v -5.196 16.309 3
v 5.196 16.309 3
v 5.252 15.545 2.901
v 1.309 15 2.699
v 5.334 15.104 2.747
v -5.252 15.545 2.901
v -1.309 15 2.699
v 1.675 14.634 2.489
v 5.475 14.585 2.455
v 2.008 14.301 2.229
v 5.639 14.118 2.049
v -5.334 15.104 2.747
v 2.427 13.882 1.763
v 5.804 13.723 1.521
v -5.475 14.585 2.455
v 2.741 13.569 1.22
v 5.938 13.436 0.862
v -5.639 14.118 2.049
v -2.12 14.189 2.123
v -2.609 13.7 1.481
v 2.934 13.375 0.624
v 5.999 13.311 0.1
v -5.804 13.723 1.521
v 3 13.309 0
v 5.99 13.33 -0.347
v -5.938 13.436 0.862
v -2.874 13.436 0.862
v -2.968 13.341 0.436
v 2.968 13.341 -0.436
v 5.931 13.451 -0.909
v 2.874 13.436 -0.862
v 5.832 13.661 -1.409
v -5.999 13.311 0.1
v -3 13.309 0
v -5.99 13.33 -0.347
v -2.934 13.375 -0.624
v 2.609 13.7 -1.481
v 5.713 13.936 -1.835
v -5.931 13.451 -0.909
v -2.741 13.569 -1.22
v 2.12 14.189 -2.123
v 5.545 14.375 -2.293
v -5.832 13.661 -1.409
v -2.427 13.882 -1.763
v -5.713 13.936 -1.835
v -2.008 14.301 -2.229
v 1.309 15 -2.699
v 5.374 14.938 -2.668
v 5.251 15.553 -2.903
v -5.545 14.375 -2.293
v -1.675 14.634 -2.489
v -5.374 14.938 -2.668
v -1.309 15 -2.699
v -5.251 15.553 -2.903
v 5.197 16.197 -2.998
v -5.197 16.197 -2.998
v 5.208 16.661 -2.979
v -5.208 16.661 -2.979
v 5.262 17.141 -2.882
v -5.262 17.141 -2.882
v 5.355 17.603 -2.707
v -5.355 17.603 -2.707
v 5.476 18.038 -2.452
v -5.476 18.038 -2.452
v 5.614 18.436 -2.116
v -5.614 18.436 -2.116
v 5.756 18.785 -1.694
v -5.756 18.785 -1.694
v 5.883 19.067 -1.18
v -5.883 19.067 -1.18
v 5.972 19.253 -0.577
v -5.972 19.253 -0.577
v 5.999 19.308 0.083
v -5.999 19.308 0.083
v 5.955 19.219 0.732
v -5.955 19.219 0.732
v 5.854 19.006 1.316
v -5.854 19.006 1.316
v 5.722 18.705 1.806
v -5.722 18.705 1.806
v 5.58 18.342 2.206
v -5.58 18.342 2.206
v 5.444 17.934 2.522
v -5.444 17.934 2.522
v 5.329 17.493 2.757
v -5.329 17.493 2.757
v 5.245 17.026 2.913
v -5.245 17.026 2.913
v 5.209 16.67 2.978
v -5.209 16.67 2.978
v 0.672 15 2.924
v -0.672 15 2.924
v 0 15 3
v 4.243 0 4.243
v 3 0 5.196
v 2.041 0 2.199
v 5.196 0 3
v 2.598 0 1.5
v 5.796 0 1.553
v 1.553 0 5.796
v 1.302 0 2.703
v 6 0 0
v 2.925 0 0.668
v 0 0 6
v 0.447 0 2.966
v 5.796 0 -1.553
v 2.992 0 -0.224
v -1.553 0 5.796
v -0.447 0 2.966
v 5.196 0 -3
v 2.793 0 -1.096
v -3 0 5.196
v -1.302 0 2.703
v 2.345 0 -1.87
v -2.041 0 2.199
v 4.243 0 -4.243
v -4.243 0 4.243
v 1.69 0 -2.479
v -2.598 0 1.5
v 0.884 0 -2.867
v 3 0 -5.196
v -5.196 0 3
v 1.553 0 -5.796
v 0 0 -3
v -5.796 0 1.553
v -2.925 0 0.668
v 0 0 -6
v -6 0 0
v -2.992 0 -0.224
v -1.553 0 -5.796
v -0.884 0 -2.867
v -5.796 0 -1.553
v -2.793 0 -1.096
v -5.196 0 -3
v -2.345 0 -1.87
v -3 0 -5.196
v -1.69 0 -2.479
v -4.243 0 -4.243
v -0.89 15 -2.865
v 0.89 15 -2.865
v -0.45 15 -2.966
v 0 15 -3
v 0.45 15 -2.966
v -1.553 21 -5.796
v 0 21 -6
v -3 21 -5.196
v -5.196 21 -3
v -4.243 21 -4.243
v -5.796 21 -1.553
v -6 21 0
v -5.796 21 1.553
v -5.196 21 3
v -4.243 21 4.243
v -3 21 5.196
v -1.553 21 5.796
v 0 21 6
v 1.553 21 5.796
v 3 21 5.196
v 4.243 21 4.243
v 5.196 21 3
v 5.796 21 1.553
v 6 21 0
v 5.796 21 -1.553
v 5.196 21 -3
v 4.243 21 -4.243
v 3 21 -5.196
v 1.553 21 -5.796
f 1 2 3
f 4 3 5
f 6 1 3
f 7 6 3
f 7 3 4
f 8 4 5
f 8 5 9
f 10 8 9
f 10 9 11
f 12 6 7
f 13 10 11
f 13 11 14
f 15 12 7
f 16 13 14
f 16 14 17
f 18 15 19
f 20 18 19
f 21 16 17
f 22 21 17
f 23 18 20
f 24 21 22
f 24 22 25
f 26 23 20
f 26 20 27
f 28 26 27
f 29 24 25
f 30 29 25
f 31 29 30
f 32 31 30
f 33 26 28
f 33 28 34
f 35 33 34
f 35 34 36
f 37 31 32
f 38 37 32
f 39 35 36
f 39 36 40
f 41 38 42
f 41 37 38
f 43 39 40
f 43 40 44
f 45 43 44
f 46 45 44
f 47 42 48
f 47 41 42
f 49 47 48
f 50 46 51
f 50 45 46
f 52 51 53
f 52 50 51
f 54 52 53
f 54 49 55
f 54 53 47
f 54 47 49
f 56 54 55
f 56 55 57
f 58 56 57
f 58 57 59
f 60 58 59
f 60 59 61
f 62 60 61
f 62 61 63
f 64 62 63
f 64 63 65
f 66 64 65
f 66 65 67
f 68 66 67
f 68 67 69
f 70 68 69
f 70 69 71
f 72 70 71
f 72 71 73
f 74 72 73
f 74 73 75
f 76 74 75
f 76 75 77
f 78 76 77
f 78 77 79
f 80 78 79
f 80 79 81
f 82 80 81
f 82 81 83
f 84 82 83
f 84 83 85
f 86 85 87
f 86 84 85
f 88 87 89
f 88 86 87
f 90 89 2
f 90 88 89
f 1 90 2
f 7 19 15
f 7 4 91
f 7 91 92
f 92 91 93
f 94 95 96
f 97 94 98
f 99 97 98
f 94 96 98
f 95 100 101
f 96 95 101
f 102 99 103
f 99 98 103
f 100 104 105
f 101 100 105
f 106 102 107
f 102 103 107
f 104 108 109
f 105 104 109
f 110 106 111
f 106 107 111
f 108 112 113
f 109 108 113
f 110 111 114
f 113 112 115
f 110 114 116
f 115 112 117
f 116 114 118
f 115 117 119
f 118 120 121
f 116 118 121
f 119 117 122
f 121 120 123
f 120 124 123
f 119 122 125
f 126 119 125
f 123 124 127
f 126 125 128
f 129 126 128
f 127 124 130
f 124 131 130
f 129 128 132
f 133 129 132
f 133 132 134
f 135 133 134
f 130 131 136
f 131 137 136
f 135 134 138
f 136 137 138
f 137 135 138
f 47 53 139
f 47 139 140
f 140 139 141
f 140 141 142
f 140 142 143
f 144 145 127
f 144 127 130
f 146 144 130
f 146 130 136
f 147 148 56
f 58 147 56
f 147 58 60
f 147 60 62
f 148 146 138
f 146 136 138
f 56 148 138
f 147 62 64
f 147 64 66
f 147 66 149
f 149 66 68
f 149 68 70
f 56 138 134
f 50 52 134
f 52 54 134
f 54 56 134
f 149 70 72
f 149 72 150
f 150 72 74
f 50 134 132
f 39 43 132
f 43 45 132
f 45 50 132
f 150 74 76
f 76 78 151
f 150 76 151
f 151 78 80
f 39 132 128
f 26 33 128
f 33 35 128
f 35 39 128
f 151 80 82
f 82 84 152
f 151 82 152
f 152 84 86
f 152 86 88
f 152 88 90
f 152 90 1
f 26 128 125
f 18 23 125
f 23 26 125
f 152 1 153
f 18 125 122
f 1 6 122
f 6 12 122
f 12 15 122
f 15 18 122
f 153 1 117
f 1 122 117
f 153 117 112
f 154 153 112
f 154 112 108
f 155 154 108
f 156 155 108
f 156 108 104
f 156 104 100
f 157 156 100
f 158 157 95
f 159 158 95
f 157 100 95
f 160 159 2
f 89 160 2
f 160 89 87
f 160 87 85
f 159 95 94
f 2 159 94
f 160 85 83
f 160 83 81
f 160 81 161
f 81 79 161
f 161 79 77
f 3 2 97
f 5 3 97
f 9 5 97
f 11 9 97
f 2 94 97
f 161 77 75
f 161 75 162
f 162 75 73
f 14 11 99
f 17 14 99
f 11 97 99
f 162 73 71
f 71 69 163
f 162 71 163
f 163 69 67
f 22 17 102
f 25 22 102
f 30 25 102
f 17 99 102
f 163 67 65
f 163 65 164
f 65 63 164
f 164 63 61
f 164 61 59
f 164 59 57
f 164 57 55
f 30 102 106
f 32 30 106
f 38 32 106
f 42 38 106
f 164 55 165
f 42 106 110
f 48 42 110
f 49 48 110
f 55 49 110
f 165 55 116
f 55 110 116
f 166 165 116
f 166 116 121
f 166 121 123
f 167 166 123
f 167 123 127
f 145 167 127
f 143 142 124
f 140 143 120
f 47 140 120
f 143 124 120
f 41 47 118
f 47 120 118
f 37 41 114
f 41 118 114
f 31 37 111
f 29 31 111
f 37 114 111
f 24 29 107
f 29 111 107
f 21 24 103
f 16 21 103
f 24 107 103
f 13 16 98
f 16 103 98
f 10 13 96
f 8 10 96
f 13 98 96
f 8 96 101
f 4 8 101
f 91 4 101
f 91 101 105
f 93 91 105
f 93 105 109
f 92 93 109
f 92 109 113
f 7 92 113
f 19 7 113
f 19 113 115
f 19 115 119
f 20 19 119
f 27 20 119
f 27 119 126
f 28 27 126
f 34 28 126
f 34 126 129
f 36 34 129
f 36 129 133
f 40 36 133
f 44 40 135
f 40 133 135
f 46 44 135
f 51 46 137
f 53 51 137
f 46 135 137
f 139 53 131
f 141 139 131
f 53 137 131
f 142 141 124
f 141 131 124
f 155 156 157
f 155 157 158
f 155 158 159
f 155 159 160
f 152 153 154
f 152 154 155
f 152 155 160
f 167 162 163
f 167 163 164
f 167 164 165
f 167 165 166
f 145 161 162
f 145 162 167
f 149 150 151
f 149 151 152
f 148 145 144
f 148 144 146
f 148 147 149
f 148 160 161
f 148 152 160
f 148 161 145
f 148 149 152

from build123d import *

# Parameters (mm, degrees)
SKETCH_1_R               = 6
EXTRUDE_2_DEPTH          = 21
SKETCH_2_R               = 3
CUT_EXTRUDE_1_DEPTH      = 15
CUT_EXTRUDE_2_DEPTH      = 10
CUT_EXTRUDE_2_DEPTH_BACK = 10
SKETCH_3_R               = 3


with BuildPart() as part:
    # 草图1 → 凸台-拉伸2 (new body)
    with BuildSketch(Plane(origin=(0, 0, 0), x_dir=(1, 0, 0), z_dir=(0, 1, 0))):
        Circle(SKETCH_1_R)
    extrude(amount=EXTRUDE_2_DEPTH)

    # 草图2 → 切除-拉伸1 (cut)
    with BuildSketch(Plane.XZ):
        Circle(SKETCH_2_R)
    extrude(amount=-CUT_EXTRUDE_1_DEPTH, mode=Mode.SUBTRACT)

    # 草图3 → 切除-拉伸2 (cut, two sides: drawn at the far end of the back side and taken through both)
    with BuildSketch(Plane(origin=(0, 0, 0), x_dir=(0, 0, -1), z_dir=(1, 0, 0)).offset(-CUT_EXTRUDE_2_DEPTH_BACK)):
        with Locations((0, 16.309431348)):
            Circle(SKETCH_3_R)
    extrude(amount=CUT_EXTRUDE_2_DEPTH + CUT_EXTRUDE_2_DEPTH_BACK, mode=Mode.SUBTRACT)


solid = part.part
